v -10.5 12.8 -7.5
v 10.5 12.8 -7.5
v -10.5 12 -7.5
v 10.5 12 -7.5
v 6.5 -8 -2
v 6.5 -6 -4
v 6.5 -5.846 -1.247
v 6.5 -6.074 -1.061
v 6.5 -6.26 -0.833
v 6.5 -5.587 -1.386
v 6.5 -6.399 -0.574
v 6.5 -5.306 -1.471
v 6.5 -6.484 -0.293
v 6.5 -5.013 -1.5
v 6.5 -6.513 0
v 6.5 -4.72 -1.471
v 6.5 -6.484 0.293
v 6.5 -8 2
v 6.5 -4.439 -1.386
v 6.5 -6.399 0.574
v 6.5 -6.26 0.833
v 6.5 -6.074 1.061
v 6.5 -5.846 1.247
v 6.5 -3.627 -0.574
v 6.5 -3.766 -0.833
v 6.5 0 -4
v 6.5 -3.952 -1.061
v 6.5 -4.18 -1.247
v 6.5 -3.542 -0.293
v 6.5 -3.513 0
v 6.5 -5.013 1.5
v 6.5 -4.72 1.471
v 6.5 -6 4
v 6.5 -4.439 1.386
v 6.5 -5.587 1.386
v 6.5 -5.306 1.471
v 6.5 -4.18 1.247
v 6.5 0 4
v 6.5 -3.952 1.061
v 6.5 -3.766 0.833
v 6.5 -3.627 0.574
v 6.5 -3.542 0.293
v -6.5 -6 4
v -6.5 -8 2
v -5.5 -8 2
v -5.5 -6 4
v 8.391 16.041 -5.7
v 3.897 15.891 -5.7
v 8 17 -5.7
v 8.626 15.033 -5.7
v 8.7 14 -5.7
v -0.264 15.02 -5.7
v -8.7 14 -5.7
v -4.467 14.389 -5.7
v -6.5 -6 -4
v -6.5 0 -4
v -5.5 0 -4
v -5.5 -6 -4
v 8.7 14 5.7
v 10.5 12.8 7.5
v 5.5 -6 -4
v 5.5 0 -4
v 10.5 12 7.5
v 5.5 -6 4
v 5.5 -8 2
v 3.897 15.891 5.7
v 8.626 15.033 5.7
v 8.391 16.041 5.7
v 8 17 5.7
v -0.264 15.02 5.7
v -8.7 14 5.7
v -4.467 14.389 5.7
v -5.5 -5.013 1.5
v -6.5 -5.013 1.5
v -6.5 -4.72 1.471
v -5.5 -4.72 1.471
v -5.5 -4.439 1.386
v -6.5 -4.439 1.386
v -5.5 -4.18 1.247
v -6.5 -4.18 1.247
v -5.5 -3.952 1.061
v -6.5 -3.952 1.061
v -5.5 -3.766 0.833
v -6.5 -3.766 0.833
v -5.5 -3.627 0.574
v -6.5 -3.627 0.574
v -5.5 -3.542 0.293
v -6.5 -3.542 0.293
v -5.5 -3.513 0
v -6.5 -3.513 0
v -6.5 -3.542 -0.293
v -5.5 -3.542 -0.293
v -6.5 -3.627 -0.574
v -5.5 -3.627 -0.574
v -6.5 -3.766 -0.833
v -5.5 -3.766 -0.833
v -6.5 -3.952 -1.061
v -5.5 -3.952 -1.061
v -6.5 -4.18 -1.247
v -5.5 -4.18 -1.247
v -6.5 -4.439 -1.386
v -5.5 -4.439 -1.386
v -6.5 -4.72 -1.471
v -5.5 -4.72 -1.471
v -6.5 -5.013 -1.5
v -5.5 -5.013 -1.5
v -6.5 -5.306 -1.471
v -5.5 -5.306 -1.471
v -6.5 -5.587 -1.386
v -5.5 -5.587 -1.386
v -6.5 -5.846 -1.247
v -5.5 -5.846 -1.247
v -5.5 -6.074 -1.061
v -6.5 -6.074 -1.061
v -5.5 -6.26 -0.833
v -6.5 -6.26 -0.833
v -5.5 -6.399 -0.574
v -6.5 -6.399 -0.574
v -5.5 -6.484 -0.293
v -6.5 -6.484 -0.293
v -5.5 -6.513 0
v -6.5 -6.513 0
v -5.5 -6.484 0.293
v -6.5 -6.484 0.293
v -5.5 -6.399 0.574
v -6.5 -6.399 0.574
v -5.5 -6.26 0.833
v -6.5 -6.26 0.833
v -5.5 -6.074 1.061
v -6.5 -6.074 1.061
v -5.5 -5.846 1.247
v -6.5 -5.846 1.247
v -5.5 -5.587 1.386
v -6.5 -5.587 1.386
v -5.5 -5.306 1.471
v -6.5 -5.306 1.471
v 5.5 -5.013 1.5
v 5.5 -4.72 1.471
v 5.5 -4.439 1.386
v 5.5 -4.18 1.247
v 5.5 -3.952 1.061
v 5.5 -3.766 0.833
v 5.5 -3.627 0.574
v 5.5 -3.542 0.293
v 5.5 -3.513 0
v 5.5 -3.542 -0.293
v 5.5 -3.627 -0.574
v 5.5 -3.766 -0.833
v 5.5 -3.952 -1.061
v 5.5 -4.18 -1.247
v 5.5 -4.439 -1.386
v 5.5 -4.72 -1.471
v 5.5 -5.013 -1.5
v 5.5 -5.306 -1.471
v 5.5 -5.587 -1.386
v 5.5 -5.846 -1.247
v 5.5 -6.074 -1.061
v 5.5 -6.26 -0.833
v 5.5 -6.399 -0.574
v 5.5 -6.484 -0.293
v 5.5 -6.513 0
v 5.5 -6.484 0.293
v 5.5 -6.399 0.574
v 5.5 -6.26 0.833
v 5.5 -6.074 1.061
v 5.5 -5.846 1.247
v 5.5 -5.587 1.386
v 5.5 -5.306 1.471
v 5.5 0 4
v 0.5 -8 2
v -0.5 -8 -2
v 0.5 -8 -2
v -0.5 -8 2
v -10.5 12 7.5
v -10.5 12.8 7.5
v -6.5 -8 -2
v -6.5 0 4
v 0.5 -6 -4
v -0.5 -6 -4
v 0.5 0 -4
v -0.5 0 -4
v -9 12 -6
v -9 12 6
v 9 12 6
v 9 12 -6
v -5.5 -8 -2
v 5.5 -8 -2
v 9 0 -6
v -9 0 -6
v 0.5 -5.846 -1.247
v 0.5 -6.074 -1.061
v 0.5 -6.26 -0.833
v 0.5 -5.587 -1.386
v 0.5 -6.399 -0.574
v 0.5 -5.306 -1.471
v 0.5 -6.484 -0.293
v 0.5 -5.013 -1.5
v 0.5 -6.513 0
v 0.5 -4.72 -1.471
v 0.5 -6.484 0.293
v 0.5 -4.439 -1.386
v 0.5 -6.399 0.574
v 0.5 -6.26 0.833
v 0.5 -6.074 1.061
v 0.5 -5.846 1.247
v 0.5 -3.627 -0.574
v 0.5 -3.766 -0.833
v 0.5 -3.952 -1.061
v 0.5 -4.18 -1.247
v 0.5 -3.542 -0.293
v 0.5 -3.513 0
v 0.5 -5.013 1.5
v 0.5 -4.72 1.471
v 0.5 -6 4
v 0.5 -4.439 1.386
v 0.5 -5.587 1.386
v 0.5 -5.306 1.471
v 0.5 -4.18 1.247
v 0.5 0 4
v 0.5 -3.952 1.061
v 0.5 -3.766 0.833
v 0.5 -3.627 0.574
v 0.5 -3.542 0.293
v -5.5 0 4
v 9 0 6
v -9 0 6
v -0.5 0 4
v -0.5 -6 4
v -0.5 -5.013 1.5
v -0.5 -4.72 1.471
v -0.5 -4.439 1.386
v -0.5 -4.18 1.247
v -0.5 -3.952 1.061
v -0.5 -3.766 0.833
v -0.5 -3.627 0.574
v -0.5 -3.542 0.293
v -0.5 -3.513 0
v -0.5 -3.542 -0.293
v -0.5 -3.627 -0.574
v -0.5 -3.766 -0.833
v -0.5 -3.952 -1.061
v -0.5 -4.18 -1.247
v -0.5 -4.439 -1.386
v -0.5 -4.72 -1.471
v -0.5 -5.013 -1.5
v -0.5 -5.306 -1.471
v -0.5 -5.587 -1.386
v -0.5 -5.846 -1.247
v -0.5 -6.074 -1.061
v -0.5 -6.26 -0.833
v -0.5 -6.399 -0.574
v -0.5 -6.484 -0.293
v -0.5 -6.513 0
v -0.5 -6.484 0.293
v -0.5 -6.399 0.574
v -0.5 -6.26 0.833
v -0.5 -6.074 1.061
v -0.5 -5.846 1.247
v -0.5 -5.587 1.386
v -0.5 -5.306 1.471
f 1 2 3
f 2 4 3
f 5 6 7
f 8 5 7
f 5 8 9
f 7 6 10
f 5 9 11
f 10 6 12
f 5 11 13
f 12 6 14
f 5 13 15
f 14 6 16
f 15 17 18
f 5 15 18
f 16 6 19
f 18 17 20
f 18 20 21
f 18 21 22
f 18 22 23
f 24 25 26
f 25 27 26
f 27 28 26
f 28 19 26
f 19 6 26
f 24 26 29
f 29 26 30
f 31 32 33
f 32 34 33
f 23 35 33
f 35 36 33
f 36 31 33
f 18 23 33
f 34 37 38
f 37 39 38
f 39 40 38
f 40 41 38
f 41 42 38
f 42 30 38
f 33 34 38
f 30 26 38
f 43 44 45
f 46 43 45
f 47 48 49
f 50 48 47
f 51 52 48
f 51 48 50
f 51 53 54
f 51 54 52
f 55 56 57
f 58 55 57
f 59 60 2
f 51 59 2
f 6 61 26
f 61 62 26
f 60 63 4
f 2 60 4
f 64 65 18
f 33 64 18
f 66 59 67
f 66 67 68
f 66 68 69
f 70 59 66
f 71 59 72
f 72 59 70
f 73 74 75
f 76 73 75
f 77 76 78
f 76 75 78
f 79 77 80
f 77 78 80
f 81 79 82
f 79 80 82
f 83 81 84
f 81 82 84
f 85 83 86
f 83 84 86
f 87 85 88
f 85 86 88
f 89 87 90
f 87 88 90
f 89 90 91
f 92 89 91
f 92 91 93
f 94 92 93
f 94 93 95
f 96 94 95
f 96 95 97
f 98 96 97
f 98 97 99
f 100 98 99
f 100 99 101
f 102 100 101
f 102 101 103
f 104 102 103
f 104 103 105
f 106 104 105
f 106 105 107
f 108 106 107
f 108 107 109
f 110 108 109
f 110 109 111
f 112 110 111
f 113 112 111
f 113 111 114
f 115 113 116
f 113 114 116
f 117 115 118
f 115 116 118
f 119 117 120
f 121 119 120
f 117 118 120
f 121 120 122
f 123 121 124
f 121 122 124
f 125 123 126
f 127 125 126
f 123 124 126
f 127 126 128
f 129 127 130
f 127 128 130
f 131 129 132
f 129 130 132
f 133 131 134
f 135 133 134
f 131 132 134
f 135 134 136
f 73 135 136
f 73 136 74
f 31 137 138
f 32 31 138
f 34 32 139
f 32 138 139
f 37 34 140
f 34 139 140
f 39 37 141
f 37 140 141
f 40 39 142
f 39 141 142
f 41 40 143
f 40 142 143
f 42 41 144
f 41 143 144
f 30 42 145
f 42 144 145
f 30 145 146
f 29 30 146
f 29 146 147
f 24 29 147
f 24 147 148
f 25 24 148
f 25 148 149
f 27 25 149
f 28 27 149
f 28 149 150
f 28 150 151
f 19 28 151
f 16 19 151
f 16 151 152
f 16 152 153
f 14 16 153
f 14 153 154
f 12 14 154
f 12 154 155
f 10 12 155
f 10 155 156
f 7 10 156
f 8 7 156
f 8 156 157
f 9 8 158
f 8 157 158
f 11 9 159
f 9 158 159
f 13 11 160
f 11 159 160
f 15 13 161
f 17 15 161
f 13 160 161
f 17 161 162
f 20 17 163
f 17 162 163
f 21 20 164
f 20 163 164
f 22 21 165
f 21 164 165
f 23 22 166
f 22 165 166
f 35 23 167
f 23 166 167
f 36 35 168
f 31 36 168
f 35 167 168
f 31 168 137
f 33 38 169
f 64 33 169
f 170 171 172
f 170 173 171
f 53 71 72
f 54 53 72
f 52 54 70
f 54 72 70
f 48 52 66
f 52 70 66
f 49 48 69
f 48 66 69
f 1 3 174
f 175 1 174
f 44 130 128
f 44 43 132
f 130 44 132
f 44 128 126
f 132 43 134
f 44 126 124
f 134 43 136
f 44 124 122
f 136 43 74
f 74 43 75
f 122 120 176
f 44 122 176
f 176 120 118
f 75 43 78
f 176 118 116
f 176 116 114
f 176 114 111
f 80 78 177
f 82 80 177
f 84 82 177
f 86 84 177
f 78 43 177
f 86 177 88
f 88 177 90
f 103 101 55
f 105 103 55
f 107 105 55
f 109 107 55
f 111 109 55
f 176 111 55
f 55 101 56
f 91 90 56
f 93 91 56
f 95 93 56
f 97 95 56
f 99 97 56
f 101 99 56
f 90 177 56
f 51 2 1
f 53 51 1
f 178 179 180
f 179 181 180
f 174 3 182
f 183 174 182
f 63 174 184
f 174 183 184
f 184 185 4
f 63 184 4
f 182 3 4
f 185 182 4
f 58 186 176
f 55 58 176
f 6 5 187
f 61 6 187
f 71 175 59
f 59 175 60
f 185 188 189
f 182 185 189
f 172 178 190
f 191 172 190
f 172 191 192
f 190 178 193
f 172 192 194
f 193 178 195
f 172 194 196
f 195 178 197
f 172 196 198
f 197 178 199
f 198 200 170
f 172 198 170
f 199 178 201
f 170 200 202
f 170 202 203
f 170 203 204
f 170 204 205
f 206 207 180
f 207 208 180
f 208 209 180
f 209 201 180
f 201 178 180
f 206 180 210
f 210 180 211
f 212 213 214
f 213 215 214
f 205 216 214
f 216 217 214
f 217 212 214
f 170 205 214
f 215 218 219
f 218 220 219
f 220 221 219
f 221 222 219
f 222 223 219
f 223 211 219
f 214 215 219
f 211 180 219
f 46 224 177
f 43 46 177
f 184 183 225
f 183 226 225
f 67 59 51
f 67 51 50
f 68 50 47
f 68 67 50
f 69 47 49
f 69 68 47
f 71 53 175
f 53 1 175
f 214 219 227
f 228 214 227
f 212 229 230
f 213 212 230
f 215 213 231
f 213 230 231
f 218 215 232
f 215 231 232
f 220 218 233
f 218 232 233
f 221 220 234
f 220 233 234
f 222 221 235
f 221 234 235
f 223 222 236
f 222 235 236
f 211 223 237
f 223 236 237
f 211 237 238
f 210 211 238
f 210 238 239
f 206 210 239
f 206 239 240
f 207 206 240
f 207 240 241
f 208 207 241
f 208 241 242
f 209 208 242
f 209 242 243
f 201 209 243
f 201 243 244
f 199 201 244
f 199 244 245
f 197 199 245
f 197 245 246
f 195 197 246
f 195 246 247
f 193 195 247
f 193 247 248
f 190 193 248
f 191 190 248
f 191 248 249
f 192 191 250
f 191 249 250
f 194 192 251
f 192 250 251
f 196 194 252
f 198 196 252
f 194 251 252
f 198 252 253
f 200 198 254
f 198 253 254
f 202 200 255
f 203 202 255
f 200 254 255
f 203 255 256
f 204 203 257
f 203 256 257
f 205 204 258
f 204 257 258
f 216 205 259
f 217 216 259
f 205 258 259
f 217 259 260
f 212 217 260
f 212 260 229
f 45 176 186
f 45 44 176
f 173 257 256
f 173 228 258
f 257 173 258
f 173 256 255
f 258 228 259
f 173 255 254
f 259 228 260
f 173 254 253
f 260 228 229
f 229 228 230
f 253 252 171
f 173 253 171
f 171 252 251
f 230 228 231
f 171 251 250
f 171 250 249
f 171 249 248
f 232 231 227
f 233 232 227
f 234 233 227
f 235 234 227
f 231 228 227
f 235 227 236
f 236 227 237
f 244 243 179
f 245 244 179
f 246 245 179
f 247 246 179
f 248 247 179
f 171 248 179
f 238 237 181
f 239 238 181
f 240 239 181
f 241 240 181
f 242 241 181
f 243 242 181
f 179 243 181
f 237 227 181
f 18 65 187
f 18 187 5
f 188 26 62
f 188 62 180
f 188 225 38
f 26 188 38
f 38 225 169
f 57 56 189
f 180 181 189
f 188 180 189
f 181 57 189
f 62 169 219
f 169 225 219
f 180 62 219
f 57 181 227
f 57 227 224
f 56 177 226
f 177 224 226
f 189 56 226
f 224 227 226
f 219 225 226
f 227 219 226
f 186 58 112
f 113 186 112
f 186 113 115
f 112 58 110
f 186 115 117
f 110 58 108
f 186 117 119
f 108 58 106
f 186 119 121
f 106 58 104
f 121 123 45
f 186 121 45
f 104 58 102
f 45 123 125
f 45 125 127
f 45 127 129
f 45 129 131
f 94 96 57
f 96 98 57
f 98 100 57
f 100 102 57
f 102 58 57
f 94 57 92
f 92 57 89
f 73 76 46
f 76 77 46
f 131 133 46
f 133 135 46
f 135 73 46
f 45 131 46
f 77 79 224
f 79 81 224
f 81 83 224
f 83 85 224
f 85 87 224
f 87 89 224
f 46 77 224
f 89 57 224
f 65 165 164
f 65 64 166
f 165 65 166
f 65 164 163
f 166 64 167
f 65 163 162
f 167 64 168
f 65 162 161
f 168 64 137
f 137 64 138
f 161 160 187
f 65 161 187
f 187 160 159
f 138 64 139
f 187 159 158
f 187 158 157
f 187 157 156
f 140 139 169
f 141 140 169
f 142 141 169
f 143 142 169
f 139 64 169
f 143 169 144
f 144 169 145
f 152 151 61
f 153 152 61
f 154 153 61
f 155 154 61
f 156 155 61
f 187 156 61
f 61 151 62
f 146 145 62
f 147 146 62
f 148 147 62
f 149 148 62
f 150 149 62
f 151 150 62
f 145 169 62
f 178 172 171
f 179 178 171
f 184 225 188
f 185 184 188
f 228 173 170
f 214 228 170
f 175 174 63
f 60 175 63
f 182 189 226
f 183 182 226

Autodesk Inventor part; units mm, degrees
ref_plane "YZ Plane" through (0, 0, 0) normal (1, 0, 0) x (0, 1, 0)
ref_plane "XZ Plane" through (0, 0, 0) normal (0, 1, 0) x (-1, 0, 0)
ref_plane "XY Plane" through (0, 0, 0) normal (0, 0, 1) x (1, 0, 0)
sketch "Sketch1" plane through (0, 0, 0) normal (0, 1, 0) x (-1, 0, 0)
  line L0 (-9, 6) -> (-9, -6)
  line L1 (-9, -6) -> (9, -6)
  line L2 (9, -6) -> (9, 6)
  line L3 (9, 6) -> (-9, 6)
  line L4 (-9, 6) -> (9, -6) construction
  line L5 (-9, -6) -> (9, 6) construction
  point P0 (0, 0)
  dimension "d0" = 12
  dimension "d1" = 18
extrude "Extrusion1" add sketch "Sketch1" along normal blind 12
sketch "Sketch2" plane through (0, 12, 0) normal (0, 1, 0) x (1, 0, 0)
  line L0 (10.5, -7.5) -> (10.5, 7.5)
  line L1 (10.5, 7.5) -> (-10.5, 7.5)
  line L2 (-10.5, 7.5) -> (-10.5, -7.5)
  line L3 (-10.5, -7.5) -> (10.5, -7.5)
  line L4 (10.5, -7.5) -> (-10.5, 7.5) construction
  line L5 (10.5, 7.5) -> (-10.5, -7.5) construction
  point P0 (0, 0)
  dimension "d4" = 15
  dimension "d5" = 21
extrude "Extrusion2" add sketch "Sketch2" along normal blind 2
chamfer "Chamfer1" distance 1.8 distance2 1.2 1 edges at (10.5, 14, 0) measured on face at (3.5, 14, 2.5)
chamfer "Chamfer2" distance 1.8 distance2 1.2 1 edges at (-0.9, 14, 7.5) measured on face at (2.3, 14, 2.5)
chamfer "Chamfer3" distance 1.8 distance2 1.2 1 edges at (-10.5, 14, -0.9) measured on face at (-4.1, 14, 1.3)
chamfer "Chamfer4" distance 1.8 distance2 1.2 1 edges at (0, 14, -7.5) measured on face at (2.9, 14, 1.3)
sketch "Sketch3" plane through (0, 14, 0) normal (0, 1, 0) x (1, 0, 0)
  line L0 (-8.7, 5.7) -> (8.7, 5.7) projected
  line L1 (-8.7, -5.7) -> (-8.7, 5.7) projected
  line L2 (8.7, -5.7) -> (-8.7, -5.7) projected
  line L3 (8.7, 5.7) -> (8.7, -5.7) projected
  point P0 (0, 0)
extrude "Extrusion3" add sketch "Sketch3" along normal blind 3
sketch "Sketch4" plane through (-8.7, 14, 5.7) normal (0, 0, 1) x (1, 0, 0)
  line L0 (17.4, 0) -> (0, 0) projected
  line L1 (17.4, 0) -> (17.4, 3) projected
  line L2 (0, 3) -> (17.4, 3) projected
  line L3 (0, 0) -> (0, 3) projected
  line L4 (17.4, 0) -> (17.4, 3)
  line L5 (17.4, 3) -> (0, 3)
  line L6 (0, 3) -> (0, 0)
  line L7 (0, 0) -> (17.4, 0)
  line L8 (17.4, 0) -> (16.7, 0)
  line L9 (17.4, 0) -> (0, 0) projected
  line L10 (16.7, 0) -> (16.7, 3)
  line L11 (0, 3) -> (17.4, 3) projected
  arc A0 (0, 0) -> (16.7, 3) centre (-4.649, 73.861) ccw
  arc A1 (17.4, 0) -> (16.7, 3) centre (10.8425, 0.0516) ccw
  point P0 (8.7, -14)
  dimension "d24" = 0.7
extrude "Extrusion4" cut sketch "Sketch4" against normal through all contours A1 L2 L1 | A0 L3 L2
sketch "Sketch5" plane through (0, 0, 0) normal (0, -1, 0) x (1, 0, 0)
  line L0 (0.5, -4) -> (0.5, 4)
  line L1 (0.5, 4) -> (-0.5, 4)
  line L2 (-0.5, 4) -> (-0.5, -4)
  line L3 (-0.5, -4) -> (0.5, -4)
  line L4 (0.5, -4) -> (-0.5, 4) construction
  line L5 (0.5, 4) -> (-0.5, -4) construction
  line L6 (0, 0) -> (-6, 0)
  line L7 (0, 0) -> (6, 0)
  line L8 (-5.5, -4) -> (-5.5, 4)
  line L9 (-5.5, 4) -> (-6.5, 4)
  line L10 (-6.5, 4) -> (-6.5, -4)
  line L11 (-6.5, -4) -> (-5.5, -4)
  line L12 (-5.5, -4) -> (-6.5, 4) construction
  line L13 (-5.5, 4) -> (-6.5, -4) construction
  line L14 (6.5, -4) -> (6.5, 4)
  line L15 (6.5, 4) -> (5.5, 4)
  line L16 (5.5, 4) -> (5.5, -4)
  line L17 (5.5, -4) -> (6.5, -4)
  line L18 (6.5, -4) -> (5.5, 4) construction
  line L19 (6.5, 4) -> (5.5, -4) construction
  dimension "d27" = 8
  dimension "d28" = 1
  dimension "d29" = 6
  dimension "d30" = 6
  dimension "d31" = 1
  dimension "d32" = 1
extrude "Extrusion5" add sketch "Sketch5" along normal blind 8
chamfer "Chamfer5" distance 2 angle 45 6 edges at (6, -8, -4) (6, -8, 4) (0, -8, 4) (-6, -8, 4) (-6, -8, -4) (0, -8, -4)
sketch "Sketch6" plane through (-6.5, 0, -4) normal (-1, 0, 0) x (0, 0, 1)
  circle A0 centre (4, -5.0131) radius 1.5
  point P0 (4, 0)
  dimension "d38" = 3
extrude "Extrusion6" cut sketch "Sketch6" against normal blind 24.25
properties part number "Toggle switch"
